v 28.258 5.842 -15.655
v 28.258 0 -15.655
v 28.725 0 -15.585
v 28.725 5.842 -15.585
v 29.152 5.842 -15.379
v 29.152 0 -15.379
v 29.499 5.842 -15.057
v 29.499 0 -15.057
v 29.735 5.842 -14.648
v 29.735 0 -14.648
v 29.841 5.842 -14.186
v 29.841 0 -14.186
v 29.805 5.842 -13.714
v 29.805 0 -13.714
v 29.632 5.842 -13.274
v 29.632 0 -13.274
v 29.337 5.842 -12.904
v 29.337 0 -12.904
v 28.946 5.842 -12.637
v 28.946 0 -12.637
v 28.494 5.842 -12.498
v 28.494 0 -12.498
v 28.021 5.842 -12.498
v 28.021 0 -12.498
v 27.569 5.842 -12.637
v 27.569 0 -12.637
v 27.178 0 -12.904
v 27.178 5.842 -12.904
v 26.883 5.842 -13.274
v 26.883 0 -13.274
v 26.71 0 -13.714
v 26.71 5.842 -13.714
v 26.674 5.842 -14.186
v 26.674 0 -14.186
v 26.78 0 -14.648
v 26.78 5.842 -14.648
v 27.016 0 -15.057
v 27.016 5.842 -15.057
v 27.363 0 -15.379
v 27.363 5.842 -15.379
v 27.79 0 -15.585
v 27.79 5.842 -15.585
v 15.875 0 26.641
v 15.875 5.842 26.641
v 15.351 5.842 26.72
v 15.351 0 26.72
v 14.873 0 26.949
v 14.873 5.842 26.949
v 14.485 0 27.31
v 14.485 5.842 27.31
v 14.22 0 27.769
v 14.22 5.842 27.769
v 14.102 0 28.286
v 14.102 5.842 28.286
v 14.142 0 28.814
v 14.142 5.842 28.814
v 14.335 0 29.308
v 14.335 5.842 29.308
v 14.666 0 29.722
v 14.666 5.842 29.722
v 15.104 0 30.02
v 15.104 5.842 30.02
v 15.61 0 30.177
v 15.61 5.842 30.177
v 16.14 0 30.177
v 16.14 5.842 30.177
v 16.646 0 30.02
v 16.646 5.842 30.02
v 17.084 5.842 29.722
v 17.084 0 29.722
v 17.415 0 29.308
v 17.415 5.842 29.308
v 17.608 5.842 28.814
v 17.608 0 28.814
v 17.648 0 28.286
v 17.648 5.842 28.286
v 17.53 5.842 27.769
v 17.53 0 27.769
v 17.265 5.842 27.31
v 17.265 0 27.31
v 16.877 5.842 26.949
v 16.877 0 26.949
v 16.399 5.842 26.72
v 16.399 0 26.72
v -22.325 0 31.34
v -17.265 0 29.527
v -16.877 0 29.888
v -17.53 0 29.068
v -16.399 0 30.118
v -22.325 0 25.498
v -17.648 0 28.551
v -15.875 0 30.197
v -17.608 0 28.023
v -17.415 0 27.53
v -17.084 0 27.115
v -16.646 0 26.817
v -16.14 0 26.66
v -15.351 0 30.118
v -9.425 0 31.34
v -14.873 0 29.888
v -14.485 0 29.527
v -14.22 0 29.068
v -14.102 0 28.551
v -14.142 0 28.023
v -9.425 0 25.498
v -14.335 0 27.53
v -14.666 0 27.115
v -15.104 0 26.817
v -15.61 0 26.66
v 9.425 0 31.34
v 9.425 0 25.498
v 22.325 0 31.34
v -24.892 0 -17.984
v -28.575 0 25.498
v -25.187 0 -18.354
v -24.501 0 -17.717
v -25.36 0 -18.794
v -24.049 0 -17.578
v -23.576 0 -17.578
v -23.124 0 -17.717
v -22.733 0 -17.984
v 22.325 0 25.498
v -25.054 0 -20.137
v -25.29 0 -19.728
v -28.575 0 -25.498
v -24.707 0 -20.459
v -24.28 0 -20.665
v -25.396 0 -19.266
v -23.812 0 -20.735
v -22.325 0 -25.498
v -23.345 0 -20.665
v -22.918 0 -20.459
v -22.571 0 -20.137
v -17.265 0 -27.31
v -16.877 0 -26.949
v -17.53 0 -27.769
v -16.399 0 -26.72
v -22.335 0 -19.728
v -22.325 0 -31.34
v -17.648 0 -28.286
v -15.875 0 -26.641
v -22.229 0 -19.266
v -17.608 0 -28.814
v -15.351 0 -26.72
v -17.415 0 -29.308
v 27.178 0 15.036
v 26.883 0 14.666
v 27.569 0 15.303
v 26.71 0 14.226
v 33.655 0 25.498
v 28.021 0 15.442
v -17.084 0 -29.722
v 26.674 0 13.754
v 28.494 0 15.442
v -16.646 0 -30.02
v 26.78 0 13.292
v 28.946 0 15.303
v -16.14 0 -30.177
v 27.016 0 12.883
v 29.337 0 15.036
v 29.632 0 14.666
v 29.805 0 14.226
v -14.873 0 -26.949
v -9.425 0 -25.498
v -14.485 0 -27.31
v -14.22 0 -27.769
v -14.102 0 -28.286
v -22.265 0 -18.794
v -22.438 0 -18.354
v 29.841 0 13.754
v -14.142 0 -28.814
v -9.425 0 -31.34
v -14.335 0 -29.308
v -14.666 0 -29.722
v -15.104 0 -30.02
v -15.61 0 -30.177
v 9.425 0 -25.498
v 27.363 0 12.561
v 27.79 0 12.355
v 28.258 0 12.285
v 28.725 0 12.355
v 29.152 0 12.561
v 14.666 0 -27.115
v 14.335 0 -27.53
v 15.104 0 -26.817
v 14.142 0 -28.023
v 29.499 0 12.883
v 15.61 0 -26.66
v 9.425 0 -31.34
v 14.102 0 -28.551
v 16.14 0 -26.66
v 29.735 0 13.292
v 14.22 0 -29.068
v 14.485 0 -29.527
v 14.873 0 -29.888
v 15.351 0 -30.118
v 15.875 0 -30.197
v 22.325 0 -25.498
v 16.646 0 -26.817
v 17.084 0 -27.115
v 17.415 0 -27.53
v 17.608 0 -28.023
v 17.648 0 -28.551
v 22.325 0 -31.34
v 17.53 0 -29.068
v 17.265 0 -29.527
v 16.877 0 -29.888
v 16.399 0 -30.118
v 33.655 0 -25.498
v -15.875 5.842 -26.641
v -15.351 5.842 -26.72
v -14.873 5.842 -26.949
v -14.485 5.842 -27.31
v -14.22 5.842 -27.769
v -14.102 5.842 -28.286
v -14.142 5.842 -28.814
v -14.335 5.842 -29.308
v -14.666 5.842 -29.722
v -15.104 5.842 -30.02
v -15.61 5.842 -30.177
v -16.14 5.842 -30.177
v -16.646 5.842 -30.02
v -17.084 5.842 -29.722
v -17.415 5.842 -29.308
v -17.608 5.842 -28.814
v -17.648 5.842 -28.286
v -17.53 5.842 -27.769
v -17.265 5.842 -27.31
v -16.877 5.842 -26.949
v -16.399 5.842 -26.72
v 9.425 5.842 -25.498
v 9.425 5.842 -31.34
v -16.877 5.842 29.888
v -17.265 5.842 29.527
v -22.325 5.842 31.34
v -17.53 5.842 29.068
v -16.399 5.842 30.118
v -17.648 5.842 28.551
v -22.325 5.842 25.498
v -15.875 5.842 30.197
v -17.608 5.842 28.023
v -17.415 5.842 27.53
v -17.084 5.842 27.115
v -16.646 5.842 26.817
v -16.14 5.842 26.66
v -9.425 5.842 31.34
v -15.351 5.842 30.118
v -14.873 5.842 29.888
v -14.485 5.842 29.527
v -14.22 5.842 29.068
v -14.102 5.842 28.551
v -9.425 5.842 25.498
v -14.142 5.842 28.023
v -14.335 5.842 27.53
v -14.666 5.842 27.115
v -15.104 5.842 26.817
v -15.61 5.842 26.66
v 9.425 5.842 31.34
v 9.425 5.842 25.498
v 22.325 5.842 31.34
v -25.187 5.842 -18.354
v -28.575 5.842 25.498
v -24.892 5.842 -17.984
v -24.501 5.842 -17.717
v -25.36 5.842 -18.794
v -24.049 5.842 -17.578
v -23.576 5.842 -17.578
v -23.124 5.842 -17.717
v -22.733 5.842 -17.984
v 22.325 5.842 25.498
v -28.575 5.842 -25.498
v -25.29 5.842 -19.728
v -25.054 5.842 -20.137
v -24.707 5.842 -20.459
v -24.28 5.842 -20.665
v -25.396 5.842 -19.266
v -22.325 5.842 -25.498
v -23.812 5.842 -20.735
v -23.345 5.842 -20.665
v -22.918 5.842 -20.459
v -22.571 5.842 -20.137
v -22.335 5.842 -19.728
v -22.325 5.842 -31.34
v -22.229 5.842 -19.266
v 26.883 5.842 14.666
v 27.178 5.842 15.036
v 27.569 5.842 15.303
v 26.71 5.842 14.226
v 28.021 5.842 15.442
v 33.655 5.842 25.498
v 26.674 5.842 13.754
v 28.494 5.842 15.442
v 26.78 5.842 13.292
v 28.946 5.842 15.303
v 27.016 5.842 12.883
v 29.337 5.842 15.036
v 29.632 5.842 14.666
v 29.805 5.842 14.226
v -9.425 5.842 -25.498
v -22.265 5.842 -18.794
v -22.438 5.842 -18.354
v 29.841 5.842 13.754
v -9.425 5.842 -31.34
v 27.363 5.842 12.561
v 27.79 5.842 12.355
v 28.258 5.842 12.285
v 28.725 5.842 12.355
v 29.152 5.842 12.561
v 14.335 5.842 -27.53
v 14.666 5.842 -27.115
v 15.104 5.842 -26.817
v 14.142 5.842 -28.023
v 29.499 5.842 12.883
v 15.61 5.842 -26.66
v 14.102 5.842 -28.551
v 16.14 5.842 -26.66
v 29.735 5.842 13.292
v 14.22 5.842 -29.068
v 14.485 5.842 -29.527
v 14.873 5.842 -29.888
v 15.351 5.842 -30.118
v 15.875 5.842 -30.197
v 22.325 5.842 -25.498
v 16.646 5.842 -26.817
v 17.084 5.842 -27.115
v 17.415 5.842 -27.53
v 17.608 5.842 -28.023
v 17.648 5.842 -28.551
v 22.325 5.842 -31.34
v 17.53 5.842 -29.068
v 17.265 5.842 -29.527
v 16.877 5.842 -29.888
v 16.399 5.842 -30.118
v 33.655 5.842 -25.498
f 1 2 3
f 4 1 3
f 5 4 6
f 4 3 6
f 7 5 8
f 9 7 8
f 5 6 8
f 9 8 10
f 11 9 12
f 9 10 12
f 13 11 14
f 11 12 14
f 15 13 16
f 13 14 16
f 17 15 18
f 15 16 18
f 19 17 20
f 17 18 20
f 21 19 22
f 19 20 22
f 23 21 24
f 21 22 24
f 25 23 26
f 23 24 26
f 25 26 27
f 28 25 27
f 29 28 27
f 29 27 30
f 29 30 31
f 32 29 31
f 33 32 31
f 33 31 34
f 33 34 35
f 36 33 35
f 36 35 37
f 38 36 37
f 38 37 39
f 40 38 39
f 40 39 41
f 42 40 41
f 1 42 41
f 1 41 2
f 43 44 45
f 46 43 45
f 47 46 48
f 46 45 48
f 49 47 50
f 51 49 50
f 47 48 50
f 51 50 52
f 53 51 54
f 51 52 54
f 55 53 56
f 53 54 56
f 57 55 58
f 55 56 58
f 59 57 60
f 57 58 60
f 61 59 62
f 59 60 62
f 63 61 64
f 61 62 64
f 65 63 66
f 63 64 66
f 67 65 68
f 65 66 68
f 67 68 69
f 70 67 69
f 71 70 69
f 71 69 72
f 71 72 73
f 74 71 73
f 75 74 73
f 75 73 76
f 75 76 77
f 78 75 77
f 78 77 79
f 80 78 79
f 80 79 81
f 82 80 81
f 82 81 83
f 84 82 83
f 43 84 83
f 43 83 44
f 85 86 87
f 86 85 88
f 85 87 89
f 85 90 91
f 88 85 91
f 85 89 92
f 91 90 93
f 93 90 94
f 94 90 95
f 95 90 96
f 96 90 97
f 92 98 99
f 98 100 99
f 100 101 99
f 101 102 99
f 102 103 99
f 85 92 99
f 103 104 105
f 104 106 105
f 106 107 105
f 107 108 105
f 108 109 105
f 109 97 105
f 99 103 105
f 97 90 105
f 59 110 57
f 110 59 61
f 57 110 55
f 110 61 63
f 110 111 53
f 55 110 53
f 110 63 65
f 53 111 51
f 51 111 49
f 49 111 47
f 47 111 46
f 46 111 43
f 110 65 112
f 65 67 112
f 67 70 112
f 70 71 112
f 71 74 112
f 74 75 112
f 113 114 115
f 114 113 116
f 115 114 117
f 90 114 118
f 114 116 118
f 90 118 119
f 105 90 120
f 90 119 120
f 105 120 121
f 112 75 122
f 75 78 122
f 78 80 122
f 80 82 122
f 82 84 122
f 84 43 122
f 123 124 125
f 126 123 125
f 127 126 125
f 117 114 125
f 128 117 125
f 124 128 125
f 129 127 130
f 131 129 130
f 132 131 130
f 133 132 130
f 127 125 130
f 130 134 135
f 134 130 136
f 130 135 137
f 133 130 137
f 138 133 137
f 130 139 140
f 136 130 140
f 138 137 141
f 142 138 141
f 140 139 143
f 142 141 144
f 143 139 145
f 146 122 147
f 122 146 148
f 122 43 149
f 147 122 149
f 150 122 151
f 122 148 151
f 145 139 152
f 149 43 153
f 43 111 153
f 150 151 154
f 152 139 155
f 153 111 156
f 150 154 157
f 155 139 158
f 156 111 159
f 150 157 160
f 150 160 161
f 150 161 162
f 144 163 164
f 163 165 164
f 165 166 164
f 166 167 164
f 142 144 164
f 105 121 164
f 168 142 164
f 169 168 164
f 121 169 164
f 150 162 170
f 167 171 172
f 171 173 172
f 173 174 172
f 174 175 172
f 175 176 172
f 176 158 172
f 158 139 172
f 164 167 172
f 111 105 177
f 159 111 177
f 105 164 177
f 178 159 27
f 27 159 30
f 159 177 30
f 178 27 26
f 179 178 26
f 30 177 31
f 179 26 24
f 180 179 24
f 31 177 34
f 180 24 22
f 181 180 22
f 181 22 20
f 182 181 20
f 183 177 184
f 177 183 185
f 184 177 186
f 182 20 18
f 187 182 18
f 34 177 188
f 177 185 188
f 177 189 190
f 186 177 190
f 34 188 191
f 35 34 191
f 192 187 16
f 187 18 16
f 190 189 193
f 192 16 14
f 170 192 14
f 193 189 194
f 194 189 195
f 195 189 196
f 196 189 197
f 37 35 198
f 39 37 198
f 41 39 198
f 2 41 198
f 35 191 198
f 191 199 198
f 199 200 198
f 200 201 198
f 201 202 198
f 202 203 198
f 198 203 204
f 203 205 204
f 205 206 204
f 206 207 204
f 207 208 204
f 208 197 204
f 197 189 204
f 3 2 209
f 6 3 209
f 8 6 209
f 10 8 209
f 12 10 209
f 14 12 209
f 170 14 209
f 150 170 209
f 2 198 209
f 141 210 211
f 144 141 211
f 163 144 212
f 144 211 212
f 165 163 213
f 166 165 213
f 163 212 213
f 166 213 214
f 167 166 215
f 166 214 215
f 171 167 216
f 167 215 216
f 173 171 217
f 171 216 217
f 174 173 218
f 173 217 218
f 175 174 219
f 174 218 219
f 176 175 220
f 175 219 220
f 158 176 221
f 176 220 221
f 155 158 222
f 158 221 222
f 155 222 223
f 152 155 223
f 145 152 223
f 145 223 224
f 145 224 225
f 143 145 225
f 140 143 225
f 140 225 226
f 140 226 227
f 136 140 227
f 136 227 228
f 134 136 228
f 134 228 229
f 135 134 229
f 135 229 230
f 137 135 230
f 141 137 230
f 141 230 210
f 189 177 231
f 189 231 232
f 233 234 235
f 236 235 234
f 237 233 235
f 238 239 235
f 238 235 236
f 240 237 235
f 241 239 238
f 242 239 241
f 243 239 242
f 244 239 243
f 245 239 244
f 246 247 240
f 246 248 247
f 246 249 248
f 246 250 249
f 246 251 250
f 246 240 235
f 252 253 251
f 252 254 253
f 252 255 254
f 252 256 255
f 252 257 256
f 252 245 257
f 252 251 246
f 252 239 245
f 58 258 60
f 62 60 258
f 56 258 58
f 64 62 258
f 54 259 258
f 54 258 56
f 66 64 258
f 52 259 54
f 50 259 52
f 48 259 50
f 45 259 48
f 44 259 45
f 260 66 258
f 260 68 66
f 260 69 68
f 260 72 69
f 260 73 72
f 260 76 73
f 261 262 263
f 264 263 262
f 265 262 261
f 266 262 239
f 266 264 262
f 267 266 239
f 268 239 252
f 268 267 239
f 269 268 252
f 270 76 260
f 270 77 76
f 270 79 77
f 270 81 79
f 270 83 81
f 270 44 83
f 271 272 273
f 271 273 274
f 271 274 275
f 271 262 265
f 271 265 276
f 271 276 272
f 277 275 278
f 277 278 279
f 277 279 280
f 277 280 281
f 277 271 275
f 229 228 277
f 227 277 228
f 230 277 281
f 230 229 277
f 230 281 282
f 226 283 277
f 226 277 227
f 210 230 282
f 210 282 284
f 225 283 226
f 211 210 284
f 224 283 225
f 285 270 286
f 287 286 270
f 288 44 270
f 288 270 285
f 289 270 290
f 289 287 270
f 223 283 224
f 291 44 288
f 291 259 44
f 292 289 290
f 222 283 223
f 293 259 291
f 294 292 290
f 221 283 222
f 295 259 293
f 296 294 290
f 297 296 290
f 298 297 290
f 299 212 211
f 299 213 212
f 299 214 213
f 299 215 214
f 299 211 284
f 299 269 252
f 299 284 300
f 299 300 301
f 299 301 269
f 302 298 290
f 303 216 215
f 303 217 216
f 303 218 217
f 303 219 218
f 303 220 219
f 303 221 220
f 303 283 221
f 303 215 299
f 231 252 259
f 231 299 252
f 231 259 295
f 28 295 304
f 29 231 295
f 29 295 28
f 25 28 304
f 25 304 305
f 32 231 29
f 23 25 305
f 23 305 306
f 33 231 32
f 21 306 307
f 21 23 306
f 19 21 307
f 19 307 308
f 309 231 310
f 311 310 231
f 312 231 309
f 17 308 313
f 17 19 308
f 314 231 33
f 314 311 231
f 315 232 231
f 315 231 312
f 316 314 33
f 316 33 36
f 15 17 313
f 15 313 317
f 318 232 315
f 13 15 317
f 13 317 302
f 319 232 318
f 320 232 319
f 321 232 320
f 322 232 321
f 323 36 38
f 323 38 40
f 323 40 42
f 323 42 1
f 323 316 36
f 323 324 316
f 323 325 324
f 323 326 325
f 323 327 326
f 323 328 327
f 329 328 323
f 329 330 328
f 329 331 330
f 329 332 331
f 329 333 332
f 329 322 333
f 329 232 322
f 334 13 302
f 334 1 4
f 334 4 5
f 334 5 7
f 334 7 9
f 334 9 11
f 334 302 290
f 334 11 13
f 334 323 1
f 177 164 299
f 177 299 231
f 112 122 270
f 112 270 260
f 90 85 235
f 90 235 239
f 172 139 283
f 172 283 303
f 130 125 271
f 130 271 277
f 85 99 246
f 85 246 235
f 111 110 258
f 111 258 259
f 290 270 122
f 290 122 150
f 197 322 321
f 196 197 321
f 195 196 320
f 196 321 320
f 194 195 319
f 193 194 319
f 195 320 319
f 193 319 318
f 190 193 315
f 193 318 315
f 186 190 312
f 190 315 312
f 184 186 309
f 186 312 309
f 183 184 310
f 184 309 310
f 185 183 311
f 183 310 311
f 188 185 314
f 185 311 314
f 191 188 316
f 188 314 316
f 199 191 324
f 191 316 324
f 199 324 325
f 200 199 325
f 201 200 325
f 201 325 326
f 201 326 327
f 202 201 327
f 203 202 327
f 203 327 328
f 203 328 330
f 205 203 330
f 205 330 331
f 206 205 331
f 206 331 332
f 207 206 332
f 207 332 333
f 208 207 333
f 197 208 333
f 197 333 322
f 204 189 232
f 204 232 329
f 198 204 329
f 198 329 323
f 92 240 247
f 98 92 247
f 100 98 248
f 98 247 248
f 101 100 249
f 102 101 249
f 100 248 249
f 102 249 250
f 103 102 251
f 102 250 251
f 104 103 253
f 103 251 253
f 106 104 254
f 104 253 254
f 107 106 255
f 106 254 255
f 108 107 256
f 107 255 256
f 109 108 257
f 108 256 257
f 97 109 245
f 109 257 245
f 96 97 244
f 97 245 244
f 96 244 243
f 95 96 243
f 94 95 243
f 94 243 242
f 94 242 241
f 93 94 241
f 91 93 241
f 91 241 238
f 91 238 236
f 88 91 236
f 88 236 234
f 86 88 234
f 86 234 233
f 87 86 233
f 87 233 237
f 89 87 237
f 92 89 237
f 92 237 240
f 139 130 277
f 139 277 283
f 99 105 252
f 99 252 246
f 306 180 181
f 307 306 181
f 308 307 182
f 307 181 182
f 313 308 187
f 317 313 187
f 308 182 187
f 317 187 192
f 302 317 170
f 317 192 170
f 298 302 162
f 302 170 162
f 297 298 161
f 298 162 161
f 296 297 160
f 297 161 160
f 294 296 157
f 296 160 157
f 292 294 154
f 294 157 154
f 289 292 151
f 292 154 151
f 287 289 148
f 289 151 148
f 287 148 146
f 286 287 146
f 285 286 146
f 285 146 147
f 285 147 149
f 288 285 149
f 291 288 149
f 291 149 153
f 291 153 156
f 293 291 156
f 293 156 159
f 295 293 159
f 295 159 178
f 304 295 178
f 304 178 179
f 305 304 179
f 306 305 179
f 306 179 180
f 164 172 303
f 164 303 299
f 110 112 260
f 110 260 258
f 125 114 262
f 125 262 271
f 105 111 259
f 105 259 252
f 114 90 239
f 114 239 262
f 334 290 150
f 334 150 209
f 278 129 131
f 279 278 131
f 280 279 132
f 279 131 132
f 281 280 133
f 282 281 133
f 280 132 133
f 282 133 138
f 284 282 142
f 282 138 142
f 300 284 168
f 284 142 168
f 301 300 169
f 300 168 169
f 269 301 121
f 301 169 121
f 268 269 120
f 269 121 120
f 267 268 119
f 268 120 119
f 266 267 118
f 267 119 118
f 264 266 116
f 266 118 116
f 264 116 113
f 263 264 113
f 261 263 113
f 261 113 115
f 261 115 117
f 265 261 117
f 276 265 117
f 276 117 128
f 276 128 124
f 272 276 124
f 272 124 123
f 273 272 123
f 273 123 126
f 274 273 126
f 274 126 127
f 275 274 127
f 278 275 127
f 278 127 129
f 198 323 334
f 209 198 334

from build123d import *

# Parameters (mm, degrees)
BOSS_EXTRUDE1_DEPTH = 5.842
SKETCH2_R           = 1.778
CUT_EXTRUDE1_DEPTH  = 43.811518376
SKETCH3_W           = 5.08
SKETCH3_H           = 50.995072
BOSS_EXTRUDE2_DEPTH = 5.842
SKETCH4_R           = 1.5875
CUT_EXTRUDE2_DEPTH  = 47.356817252


with BuildPart() as part:
    # Sketch1 → Boss-Extrude1 (new body)
    with BuildSketch(Plane(origin=(0, 0, 0), x_dir=(1, 0, 0), z_dir=(0, 1, 0))):
        Polygon((22.325, -31.339536), (9.425, -31.339536), (9.425, -25.497536), (-9.425, -25.497536), (-9.425, -31.339536), (-22.325, -31.339536), (-22.325, -25.497536), (-28.575, -25.497536), (-28.575, 25.497536), (-22.325, 25.497536), (-22.325, 31.339536), (-9.425, 31.339536), (-9.425, 25.497536), (9.425, 25.497536), (9.425, 31.339536), (22.325, 31.339536), (22.325, 25.497536), (28.575, 25.497536), (28.575, -25.497536), (22.325, -25.497536), align=None)
    extrude(amount=BOSS_EXTRUDE1_DEPTH)

    # Sketch2 → Cut-Extrude1 (cut, through all)
    with BuildSketch(Plane(origin=(0, 5.842, 0), x_dir=(1, 0, 0), z_dir=(0, 1, 0))):
        with Locations(Location((-15.875, 28.418536, 0), (0, 0, 270))):
            Circle(SKETCH2_R)
        with Locations(Location((-15.875, -28.418536, 0), (0, 0, 270))):
            Circle(SKETCH2_R)
        with Locations(Location((15.875, 28.418536, 0), (0, 0, 90))):
            Circle(SKETCH2_R)
        with Locations(Location((15.875, -28.418536, 0), (0, 0, 90))):
            Circle(SKETCH2_R)
    extrude(amount=-CUT_EXTRUDE1_DEPTH, mode=Mode.SUBTRACT)

    # Sketch3 → Boss-Extrude2 (add)
    with BuildSketch(Plane(origin=(0, 5.842, 0), x_dir=(1, 0, 0), z_dir=(0, 1, 0))):
        with Locations((31.115, 0)):
            Rectangle(SKETCH3_W, SKETCH3_H)
    extrude(amount=-BOSS_EXTRUDE2_DEPTH)

    # Sketch4 → Cut-Extrude2 (cut, through all)
    with BuildSketch(Plane(origin=(0, 0, 0), x_dir=(-1, 0, 0), z_dir=(0, -1, 0))):
        with Locations(Location((23.8125, 19.147536, 0), (0, 0, 90))):
            Circle(SKETCH4_R)
        with Locations(Location((-28.2575, 14.067536, 0), (0, 0, 90))):
            Circle(SKETCH4_R)
        with Locations(Location((-28.2575, -13.872464, 0), (0, 0, 90))):
            Circle(SKETCH4_R)
    extrude(amount=-CUT_EXTRUDE2_DEPTH, mode=Mode.SUBTRACT)


solid = part.part
